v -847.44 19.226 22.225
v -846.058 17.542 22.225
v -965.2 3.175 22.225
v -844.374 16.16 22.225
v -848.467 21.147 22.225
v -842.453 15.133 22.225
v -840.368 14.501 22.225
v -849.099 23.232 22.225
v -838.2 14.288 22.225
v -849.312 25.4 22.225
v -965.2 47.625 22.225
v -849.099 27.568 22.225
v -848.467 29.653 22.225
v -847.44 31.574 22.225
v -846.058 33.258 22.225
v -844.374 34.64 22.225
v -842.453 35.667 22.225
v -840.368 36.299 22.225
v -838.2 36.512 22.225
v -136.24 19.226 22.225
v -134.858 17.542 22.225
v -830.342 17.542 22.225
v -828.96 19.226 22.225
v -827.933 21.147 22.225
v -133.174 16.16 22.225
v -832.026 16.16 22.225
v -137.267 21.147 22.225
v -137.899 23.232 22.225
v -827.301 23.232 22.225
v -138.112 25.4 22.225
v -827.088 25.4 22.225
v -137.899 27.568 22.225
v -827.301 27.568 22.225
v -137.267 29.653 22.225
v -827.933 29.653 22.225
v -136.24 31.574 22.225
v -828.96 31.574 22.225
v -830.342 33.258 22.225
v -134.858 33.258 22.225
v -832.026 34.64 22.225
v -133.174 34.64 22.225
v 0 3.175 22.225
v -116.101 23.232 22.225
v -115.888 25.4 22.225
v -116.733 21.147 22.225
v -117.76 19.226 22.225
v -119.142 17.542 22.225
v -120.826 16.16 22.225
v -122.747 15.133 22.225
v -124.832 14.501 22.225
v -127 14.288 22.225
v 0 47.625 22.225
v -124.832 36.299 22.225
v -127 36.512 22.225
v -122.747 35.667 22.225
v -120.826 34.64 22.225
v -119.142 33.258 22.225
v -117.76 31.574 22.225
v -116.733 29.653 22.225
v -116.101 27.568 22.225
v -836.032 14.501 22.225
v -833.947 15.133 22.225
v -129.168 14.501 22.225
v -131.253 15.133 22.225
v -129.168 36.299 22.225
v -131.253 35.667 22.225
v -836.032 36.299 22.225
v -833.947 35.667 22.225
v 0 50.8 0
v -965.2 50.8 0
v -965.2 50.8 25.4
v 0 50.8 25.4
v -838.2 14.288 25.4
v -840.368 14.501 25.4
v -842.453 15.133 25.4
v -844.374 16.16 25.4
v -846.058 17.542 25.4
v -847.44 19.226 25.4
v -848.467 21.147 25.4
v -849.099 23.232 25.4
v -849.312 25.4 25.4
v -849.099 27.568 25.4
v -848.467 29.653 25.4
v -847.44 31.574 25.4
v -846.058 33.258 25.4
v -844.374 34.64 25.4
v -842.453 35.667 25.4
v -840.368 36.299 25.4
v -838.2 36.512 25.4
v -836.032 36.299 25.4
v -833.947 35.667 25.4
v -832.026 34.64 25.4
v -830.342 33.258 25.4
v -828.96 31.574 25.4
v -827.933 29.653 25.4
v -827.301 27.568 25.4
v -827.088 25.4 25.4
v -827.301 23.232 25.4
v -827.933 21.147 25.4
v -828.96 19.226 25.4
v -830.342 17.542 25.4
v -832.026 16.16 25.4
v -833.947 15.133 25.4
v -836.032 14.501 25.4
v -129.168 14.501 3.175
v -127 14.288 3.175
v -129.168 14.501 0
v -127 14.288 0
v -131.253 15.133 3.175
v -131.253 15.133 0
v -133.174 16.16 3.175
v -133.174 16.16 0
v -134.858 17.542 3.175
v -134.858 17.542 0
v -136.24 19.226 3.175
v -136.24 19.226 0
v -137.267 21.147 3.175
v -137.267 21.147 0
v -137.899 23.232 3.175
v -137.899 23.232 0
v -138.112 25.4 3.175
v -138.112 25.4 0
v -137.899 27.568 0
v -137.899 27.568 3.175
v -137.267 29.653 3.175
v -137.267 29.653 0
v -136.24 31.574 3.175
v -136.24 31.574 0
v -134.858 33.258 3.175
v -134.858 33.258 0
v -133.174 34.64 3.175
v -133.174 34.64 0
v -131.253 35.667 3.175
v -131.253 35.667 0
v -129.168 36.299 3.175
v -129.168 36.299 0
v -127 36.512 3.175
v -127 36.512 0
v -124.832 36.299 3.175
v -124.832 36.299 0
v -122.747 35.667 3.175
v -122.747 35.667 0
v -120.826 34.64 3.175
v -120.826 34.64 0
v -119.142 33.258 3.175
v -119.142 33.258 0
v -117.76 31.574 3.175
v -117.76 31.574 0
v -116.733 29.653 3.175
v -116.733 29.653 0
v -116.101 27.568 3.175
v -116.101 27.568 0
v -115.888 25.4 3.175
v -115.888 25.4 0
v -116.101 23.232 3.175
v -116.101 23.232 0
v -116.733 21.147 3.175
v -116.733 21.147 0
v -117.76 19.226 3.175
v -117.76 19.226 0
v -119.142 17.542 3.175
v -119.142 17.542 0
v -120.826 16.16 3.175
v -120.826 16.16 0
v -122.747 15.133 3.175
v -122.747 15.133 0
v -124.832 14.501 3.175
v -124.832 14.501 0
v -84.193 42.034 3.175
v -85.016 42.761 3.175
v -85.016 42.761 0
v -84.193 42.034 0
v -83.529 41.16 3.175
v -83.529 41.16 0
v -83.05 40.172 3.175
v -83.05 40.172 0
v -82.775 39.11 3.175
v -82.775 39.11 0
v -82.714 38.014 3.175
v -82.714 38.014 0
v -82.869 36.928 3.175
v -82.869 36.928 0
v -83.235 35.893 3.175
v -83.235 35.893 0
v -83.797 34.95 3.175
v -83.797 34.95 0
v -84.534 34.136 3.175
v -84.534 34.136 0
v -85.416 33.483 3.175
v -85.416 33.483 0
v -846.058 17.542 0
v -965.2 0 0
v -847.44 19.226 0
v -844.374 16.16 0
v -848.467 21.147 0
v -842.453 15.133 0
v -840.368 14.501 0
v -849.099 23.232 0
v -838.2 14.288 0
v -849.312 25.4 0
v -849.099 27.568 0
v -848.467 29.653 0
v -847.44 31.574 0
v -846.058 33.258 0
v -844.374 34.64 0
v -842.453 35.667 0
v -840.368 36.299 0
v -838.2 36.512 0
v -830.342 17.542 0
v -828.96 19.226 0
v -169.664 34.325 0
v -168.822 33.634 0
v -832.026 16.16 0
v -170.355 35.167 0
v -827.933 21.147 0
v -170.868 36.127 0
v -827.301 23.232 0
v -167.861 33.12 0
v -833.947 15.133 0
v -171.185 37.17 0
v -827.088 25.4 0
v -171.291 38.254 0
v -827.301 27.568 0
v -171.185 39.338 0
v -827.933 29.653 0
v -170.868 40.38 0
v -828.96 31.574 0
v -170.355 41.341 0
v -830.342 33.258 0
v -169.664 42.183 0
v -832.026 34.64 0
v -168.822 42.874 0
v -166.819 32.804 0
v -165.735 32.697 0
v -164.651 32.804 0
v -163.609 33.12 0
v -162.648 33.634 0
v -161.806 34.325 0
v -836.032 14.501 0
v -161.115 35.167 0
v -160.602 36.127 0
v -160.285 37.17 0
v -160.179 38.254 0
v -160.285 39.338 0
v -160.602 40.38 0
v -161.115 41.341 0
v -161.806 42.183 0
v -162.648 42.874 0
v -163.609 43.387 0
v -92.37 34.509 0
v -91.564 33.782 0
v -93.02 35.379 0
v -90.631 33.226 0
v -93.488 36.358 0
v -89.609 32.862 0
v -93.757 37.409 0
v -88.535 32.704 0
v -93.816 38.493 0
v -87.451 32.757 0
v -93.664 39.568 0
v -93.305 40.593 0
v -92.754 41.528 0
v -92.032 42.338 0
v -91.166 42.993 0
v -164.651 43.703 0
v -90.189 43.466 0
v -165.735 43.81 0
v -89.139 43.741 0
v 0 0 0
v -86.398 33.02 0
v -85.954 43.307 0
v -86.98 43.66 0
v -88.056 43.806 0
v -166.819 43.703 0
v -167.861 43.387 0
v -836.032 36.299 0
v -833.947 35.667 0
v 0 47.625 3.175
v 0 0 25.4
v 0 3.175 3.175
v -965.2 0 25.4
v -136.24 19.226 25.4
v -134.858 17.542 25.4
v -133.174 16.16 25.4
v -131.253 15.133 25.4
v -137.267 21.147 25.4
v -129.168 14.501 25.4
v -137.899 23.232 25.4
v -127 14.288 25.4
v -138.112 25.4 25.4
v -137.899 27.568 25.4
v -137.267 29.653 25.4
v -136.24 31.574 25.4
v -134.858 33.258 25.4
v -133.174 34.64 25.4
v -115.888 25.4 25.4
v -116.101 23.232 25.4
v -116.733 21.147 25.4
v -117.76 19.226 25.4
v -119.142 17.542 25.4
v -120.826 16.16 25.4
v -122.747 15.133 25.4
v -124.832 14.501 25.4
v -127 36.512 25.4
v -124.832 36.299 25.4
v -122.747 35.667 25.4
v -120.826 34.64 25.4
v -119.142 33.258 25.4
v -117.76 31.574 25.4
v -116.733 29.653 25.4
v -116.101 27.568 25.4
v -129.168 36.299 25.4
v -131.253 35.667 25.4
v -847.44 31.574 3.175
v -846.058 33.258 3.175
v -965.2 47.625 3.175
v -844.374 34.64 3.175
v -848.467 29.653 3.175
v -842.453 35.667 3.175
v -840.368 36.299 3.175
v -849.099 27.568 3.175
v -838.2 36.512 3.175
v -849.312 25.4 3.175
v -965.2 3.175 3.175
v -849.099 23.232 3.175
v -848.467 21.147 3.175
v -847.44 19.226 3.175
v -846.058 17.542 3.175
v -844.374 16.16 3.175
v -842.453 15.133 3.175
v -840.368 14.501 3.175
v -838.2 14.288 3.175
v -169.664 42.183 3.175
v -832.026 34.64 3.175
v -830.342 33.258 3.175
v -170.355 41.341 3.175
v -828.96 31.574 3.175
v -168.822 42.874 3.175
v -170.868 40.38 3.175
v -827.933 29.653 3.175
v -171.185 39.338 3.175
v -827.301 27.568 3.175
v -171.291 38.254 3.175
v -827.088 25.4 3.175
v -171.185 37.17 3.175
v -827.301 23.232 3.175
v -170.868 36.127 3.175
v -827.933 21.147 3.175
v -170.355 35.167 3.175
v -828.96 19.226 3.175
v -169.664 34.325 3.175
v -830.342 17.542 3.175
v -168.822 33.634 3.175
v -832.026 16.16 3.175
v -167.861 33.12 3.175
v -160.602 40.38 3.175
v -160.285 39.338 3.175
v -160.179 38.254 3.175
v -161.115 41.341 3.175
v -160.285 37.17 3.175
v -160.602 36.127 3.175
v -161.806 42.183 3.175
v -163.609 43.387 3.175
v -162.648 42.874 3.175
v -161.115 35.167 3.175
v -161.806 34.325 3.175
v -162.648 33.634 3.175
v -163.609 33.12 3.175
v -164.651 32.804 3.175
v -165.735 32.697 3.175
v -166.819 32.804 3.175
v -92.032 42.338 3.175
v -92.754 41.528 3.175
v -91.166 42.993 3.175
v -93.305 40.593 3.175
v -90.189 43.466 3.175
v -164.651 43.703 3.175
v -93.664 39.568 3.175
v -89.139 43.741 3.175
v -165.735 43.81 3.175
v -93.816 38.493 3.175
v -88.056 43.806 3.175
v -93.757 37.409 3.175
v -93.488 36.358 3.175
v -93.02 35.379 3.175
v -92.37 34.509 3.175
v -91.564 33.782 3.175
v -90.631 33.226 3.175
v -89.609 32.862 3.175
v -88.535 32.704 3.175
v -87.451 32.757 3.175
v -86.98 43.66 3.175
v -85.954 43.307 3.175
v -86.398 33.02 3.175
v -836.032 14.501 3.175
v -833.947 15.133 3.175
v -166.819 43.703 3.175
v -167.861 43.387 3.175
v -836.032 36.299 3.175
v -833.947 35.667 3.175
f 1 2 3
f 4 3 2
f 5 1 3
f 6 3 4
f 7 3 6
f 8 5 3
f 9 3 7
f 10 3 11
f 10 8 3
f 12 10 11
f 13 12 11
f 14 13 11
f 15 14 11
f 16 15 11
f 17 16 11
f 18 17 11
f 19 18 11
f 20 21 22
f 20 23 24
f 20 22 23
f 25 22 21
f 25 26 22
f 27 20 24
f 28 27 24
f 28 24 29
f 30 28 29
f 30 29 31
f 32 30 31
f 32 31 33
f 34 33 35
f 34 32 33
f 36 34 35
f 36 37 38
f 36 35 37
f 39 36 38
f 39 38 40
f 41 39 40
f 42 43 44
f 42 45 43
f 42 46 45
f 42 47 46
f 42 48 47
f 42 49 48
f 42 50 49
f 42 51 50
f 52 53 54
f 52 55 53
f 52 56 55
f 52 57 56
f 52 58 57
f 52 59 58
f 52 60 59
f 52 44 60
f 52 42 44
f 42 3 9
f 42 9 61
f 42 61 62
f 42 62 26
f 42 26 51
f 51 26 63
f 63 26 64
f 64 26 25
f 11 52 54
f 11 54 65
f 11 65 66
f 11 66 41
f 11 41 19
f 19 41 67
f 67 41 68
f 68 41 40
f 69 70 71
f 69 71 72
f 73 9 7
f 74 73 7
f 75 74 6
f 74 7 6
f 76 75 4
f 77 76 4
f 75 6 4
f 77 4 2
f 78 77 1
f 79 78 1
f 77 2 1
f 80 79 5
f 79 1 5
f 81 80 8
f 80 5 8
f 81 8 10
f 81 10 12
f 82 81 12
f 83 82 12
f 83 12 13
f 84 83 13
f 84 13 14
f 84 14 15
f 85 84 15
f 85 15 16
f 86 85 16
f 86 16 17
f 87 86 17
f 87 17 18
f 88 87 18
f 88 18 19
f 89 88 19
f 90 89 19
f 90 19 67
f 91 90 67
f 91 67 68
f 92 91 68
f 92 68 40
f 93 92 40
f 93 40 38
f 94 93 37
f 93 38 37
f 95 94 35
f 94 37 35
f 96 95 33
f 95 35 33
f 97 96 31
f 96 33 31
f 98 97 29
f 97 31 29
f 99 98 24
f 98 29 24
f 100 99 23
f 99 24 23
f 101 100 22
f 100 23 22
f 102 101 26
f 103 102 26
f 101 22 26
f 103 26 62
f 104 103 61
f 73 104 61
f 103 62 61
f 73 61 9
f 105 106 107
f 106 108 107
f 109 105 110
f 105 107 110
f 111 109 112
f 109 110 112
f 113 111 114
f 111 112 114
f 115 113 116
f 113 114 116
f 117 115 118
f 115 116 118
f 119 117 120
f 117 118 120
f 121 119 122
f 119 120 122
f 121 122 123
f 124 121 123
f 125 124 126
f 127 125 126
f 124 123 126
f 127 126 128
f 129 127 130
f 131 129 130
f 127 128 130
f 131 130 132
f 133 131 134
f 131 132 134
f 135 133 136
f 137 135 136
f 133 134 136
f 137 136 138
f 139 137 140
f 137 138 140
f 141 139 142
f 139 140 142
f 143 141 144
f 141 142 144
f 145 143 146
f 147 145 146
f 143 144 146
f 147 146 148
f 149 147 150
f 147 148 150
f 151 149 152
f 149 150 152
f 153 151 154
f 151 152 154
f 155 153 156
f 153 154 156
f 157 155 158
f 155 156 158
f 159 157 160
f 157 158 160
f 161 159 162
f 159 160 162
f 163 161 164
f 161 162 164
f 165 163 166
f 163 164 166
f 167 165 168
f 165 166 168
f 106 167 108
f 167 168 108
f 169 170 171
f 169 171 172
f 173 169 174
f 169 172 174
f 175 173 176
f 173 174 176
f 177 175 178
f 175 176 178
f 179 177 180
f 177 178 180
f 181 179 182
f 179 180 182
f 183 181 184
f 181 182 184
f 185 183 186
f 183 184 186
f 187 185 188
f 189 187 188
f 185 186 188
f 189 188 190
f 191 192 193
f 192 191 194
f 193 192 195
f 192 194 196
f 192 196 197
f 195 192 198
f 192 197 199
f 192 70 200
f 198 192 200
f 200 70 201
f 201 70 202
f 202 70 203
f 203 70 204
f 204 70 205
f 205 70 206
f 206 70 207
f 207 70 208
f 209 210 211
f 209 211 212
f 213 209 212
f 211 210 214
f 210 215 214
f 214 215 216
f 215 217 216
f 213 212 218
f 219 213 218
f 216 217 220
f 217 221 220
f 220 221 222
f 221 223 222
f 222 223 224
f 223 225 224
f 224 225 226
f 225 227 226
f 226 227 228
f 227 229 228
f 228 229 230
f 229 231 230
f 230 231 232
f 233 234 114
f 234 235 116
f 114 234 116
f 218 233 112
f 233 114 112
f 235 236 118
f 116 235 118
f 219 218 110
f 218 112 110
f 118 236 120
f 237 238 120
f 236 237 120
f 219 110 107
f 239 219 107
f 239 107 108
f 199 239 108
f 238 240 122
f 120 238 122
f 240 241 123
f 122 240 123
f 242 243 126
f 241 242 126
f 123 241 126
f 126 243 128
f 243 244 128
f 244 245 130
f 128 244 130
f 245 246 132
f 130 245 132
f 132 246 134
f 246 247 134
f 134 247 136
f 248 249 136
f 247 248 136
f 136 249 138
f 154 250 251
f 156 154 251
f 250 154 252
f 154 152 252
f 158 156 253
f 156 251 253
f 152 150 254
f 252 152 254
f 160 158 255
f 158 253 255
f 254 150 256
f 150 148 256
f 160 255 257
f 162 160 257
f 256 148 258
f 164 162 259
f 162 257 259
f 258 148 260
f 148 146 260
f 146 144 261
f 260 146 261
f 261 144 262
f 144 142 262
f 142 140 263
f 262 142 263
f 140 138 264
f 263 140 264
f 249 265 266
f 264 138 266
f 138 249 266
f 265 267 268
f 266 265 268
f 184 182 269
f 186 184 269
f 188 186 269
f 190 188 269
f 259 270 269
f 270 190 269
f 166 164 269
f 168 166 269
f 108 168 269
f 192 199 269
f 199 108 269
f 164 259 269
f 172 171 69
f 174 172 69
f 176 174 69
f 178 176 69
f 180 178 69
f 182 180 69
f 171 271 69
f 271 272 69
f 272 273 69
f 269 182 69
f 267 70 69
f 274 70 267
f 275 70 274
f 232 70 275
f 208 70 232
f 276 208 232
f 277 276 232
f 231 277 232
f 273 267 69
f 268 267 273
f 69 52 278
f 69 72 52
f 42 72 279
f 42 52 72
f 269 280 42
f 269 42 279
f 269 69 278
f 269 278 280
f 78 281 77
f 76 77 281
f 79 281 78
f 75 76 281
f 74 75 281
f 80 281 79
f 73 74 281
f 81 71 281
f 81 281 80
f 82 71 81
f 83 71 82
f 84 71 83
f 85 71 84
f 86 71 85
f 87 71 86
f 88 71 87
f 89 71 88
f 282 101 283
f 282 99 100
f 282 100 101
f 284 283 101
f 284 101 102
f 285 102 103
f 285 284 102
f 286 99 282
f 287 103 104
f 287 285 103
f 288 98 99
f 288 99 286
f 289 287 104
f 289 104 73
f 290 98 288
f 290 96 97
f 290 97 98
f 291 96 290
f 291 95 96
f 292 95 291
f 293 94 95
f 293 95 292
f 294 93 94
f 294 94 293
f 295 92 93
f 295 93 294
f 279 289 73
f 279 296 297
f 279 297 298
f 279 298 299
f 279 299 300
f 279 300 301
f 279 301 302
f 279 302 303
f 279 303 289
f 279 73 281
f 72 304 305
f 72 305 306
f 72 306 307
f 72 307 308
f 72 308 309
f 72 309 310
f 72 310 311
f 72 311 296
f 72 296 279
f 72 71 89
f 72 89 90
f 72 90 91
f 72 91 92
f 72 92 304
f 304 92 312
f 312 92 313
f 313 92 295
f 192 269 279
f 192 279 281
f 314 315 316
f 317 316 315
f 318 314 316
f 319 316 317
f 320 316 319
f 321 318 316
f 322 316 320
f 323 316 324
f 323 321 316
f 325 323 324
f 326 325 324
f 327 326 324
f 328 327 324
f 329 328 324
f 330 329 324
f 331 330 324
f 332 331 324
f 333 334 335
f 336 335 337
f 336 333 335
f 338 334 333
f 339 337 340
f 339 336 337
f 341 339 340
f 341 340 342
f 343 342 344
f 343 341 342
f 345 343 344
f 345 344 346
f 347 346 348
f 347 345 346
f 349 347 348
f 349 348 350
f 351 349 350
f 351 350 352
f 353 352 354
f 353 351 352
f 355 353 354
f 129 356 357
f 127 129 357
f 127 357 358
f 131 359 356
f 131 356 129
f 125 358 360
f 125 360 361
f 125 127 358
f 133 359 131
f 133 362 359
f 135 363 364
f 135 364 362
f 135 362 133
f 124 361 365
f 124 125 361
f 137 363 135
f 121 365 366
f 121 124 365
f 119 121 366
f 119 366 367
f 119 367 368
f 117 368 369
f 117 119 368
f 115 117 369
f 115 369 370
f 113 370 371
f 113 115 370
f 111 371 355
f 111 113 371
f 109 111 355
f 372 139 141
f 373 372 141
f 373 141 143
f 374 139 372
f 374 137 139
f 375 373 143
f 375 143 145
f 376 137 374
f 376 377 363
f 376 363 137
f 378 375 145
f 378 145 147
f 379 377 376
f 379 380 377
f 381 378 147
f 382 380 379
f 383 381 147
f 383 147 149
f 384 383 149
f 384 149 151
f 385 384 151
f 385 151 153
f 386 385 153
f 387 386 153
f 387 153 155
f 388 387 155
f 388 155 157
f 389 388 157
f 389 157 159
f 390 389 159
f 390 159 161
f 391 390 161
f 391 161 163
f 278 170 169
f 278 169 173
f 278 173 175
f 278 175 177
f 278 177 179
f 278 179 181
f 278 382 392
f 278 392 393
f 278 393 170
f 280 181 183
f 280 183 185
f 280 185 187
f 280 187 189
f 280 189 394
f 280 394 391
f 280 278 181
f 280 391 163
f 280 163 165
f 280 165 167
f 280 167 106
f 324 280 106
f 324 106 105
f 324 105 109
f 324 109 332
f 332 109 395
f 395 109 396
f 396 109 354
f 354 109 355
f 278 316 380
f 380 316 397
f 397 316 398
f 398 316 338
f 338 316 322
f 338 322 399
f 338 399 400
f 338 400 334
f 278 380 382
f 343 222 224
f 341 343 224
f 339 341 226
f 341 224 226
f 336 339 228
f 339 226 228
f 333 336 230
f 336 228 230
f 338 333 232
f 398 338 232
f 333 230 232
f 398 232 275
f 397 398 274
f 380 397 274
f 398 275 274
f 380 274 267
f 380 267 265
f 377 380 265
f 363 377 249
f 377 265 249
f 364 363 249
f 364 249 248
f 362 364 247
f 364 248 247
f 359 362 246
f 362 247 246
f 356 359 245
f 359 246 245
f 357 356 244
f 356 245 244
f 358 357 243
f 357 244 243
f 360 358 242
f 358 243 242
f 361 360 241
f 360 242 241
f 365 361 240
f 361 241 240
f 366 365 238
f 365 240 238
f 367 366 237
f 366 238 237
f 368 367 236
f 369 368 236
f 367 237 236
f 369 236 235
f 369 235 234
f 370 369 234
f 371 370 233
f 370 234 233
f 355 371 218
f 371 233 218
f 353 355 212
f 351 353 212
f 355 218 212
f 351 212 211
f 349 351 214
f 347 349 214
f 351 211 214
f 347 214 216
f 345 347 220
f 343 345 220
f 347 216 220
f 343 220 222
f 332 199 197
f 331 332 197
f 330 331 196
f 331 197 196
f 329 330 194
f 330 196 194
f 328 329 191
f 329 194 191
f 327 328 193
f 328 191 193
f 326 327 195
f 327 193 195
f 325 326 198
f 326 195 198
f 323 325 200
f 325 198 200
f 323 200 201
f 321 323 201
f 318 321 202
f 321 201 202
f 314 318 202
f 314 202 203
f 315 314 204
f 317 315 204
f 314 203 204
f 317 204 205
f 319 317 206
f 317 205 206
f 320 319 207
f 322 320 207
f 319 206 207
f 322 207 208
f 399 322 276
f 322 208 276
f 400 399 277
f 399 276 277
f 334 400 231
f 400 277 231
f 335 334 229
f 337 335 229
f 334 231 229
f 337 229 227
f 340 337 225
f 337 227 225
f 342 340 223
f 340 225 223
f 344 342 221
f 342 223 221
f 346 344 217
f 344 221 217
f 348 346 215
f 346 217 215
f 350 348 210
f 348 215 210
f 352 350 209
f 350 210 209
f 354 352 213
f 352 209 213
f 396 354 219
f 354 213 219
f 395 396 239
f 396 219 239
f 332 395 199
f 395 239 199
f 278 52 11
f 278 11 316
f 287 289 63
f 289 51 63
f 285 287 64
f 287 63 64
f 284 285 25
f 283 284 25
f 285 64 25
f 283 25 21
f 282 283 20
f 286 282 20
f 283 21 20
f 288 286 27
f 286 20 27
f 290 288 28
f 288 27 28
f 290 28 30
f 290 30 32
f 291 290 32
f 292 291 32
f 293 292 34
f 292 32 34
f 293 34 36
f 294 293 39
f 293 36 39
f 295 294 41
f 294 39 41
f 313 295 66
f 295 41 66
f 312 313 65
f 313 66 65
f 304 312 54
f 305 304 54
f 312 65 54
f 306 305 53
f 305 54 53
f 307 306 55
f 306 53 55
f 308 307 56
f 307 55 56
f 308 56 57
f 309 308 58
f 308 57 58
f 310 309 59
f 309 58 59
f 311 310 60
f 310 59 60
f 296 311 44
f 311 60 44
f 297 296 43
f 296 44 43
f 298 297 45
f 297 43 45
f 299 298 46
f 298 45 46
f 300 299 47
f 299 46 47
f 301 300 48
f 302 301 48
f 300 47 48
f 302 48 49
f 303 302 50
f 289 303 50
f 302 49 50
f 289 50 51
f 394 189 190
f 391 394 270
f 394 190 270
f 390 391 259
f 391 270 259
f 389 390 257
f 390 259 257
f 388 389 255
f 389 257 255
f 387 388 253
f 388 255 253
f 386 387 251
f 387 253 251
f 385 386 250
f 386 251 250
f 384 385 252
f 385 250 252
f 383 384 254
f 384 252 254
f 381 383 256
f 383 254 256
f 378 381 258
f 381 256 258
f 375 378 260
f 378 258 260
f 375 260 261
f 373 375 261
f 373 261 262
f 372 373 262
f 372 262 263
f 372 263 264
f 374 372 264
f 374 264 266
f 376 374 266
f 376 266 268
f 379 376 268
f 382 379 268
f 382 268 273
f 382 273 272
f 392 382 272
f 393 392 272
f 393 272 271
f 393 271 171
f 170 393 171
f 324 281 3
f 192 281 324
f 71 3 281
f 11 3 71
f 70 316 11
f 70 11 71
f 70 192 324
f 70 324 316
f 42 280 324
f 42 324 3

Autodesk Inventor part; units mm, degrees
ref_plane "YZ Plane" through (0, 0, 0) normal (1, 0, 0) x (0, 1, 0)
ref_plane "XZ Plane" through (0, 0, 0) normal (0, 1, 0) x (-1, 0, 0)
ref_plane "XY Plane" through (0, 0, 0) normal (0, 0, 1) x (1, 0, 0)
sketch "Sketch1" plane through (0, 0, 0) normal (0, 0, 1) x (1, 0, 0)
  line L0 (0, 0) -> (-965.2, 0)
  line L1 (-965.2, 0) -> (-965.2, 50.8)
  line L2 (-965.2, 50.8) -> (0, 50.8)
  line L3 (0, 50.8) -> (0, 0)
  dimension "d0" = 50.8
  dimension "d1" = 965.2
extrude "Extrusion1" add sketch "Sketch1" along normal blind 25.4
sketch "Sketch2" plane through (0, 0, 0) normal (1, 0, 0) x (0, 0, -1)
  line L0 (-3.175, 3.175) -> (-22.225, 3.175)
  line L1 (-22.225, 3.175) -> (-22.225, 47.625)
  line L2 (-22.225, 47.625) -> (-3.175, 47.625)
  line L3 (-3.175, 47.625) -> (-3.175, 3.175)
  line L4 (0, 0) -> (-25.4, 0) projected
  line L5 (0, 50.8) -> (0, 0) projected
  line L6 (0, 50.8) -> (-25.4, 50.8) projected
  line L7 (-25.4, 0) -> (-25.4, 50.8) projected
  dimension "d5" = 3.175
  dimension "d7" = 3.175
  dimension "d8" = 3.175
  dimension "d9" = 3.175
extrude "Extrusion2" cut sketch "Sketch2" against normal blind 965.2 contours L0 L1 L2 L3
sketch "Sketch3" plane through (0, 0, 25.4) normal (0, 0, 1) x (1, 0, 0)
  circle A0 centre (-838.2, 25.4) radius 6.2992
  line L0 (-965.2, 0) -> (0, 0)
  line L1 (-965.2, 0) -> (0, 0) projected
  line L2 (-965.2, 50.8) -> (-965.2, 0) projected
  line L3 (0, 0) -> (0, 50.8) projected
  circle A1 centre (-127, 25.4) radius 11.1125
  dimension "d13" = 25.4
  dimension "d14" = 12.5984
  dimension "d16" = 127
  dimension "d18" = 22.225
hole "Hole1" at (-838.2, 25.4, 25.4) at (-127, 25.4, 25.4) direction (0, 0, -1) diameter 22.225 end through all
sketch "Sketch4" plane through (0, 0, 0) normal (0, 0, -1) x (-1, 0, 0)
  circle A0 centre (165.735, 38.2537) radius 5.5563 projected
  arc A1 (85.416, 33.4832) -> (85.0155, 42.761) centre (88.5446, 38.2658) ccw projected
  arc A2 (85.0155, 42.761) -> (85.416, 33.4832) centre (88.265, 38.2537) ccw projected
  circle A3 centre (165.735, 38.2537) radius 5.5563
  circle A4 centre (88.265, 38.2537) radius 5.5565
  point P0 (0, 0)
extrude "Extrusion3" cut sketch "Sketch4" against normal blind 5.08 contours A0 | A2 A4
